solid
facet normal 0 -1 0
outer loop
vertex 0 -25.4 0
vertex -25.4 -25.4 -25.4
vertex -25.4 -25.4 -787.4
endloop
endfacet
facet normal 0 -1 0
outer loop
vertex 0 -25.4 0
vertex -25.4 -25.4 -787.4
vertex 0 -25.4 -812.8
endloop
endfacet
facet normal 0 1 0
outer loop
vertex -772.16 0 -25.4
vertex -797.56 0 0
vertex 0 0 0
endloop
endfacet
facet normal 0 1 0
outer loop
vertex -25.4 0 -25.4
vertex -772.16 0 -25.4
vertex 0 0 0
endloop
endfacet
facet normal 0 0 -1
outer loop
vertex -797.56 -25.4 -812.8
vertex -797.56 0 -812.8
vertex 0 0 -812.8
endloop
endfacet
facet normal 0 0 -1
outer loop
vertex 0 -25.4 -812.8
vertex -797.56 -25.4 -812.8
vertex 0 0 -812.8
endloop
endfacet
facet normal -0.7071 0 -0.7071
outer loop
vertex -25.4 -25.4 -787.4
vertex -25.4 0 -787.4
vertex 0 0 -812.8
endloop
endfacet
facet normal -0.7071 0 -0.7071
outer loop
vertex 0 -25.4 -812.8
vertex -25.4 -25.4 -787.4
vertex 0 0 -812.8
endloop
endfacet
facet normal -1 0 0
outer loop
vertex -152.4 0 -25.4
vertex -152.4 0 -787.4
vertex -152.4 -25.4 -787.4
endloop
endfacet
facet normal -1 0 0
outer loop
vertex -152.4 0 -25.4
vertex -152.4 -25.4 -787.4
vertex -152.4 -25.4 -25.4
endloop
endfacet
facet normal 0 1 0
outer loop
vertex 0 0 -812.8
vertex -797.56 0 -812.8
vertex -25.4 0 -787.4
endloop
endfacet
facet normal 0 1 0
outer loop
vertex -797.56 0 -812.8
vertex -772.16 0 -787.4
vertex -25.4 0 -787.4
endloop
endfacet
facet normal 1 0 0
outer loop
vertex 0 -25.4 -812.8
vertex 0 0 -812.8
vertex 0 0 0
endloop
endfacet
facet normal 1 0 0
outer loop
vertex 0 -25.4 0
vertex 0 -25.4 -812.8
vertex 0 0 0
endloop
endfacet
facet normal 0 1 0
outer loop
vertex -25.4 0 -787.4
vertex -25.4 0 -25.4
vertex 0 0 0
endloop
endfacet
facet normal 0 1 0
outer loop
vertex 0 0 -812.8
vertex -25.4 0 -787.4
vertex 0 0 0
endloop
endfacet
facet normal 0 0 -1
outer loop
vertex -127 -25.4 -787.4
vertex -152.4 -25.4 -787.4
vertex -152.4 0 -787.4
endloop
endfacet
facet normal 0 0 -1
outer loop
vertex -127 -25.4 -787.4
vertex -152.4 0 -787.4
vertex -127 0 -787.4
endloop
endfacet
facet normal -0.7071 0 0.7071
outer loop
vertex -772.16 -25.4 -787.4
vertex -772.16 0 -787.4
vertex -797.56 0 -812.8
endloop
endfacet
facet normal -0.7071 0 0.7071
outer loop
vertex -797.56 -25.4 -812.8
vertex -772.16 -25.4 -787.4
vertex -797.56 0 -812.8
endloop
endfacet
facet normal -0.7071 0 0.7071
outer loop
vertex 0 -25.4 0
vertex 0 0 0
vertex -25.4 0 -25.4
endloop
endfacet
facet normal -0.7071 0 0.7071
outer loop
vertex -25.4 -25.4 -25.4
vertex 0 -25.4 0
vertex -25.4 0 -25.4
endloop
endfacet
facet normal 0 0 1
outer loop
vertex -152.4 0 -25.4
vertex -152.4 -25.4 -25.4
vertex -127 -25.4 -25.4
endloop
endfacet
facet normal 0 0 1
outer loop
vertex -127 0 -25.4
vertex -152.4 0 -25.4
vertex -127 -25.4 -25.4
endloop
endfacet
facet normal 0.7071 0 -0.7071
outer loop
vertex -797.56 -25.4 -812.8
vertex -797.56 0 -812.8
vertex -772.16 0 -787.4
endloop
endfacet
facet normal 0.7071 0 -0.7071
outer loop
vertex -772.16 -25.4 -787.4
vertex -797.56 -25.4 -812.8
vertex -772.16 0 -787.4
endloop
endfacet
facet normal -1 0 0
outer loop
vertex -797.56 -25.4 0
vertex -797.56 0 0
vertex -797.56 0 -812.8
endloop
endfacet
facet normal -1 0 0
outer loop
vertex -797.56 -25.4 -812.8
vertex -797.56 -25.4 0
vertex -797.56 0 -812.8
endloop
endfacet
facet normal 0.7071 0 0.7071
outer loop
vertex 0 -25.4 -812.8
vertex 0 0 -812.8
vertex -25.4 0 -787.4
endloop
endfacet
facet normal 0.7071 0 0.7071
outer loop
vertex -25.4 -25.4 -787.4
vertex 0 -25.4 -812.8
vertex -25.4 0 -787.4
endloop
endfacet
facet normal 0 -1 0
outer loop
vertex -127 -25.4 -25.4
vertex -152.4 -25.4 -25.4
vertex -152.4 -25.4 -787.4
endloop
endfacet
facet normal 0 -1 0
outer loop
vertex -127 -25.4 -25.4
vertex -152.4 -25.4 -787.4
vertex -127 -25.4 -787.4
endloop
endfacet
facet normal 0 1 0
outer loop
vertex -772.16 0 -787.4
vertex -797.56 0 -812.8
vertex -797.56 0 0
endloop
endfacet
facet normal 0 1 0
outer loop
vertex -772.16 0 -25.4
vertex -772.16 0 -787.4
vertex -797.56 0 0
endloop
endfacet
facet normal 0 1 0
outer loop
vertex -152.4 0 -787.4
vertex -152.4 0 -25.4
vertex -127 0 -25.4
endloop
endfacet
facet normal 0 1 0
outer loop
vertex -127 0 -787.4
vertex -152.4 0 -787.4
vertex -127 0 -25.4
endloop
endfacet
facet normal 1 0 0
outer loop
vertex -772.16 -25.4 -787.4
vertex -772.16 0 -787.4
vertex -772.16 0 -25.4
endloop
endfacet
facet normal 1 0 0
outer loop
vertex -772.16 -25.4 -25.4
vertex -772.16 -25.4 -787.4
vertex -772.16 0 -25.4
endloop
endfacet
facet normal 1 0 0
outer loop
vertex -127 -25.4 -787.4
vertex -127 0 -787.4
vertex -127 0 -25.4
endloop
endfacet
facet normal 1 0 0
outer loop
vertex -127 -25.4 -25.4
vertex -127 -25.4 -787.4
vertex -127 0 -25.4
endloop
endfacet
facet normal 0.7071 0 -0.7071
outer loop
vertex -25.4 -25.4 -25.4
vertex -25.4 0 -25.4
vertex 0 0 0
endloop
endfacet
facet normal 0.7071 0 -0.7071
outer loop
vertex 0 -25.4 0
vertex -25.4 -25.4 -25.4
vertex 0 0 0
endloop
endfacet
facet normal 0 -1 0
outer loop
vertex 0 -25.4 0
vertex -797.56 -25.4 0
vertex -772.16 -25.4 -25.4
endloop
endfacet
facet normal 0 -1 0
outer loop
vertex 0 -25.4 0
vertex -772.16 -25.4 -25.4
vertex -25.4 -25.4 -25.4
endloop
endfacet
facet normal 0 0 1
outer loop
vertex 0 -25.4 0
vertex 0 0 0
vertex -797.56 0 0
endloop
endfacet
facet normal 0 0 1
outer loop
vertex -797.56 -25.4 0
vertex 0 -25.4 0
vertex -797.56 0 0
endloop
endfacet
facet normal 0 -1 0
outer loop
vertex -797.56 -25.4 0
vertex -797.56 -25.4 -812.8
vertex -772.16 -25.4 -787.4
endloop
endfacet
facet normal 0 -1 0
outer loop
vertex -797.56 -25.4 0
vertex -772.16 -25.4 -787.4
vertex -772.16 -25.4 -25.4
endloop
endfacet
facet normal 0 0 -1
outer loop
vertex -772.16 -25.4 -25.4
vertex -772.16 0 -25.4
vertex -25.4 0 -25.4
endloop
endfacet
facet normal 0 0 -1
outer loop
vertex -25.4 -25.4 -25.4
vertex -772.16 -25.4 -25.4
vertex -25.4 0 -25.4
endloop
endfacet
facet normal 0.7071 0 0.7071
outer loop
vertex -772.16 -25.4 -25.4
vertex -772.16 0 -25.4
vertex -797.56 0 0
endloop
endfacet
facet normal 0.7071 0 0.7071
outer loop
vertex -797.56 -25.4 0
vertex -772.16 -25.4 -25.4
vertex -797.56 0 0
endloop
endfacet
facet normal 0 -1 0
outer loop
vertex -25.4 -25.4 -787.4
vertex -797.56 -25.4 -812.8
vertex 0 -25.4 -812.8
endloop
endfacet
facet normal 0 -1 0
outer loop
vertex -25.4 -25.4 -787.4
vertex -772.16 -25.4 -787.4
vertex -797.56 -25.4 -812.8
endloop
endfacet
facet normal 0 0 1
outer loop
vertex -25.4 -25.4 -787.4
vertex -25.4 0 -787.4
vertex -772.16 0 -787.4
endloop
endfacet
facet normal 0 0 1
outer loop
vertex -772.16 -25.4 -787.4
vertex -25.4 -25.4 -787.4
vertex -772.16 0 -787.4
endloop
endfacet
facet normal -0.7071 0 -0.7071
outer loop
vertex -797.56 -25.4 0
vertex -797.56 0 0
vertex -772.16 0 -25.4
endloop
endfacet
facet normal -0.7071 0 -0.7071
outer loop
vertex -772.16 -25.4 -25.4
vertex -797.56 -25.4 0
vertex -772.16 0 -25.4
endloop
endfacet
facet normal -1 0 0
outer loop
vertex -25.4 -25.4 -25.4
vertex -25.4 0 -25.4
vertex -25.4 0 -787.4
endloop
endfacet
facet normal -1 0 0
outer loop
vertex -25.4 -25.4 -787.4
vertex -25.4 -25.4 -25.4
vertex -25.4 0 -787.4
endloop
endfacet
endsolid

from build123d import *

# Parameters (mm, degrees)
F1_DEPTH = 25.4
F2_DEPTH = 25.4
F3_DEPTH = 25.4
F4_DEPTH = 25.4
F0_W     = 25.4
F0_H     = 762
F5_DEPTH = 25.4


with BuildPart() as f1:
    # F0 (on Front) → F1 (new body)
    with BuildSketch(Plane.XZ):
        Polygon((0, -812.8), (0, 0), (-25.4, -25.4), (-25.4, -787.4), align=None)
    extrude(amount=F1_DEPTH)


with BuildPart() as f2:
    # F0 (on Front) → F2 (new body)
    with BuildSketch(Plane.XZ):
        Polygon((-797.56, -812.8), (0, -812.8), (-25.4, -787.4), (-127, -787.4), (-152.4, -787.4), (-772.16, -787.4), align=None)
    extrude(amount=F2_DEPTH)


with BuildPart() as f3:
    # F0 (on Front) → F3 (new body)
    with BuildSketch(Plane.XZ):
        Polygon((-772.16, -25.4), (-797.56, 0), (-797.56, -812.8), (-772.16, -787.4), align=None)
    extrude(amount=F3_DEPTH)


with BuildPart() as f4:
    # F0 (on Front) → F4 (new body)
    with BuildSketch(Plane.XZ):
        Polygon((-25.4, -25.4), (0, 0), (-797.56, 0), (-772.16, -25.4), (-152.4, -25.4), (-127, -25.4), align=None)
    extrude(amount=F4_DEPTH)


with BuildPart() as f5:
    # F0 (on Front) → F5 (new body)
    with BuildSketch(Plane.XZ):
        with Locations((-139.7, -406.4)):
            Rectangle(F0_W, F0_H)
    extrude(amount=F5_DEPTH)


solid = Compound([f1.part, f2.part, f3.part, f4.part, f5.part])
